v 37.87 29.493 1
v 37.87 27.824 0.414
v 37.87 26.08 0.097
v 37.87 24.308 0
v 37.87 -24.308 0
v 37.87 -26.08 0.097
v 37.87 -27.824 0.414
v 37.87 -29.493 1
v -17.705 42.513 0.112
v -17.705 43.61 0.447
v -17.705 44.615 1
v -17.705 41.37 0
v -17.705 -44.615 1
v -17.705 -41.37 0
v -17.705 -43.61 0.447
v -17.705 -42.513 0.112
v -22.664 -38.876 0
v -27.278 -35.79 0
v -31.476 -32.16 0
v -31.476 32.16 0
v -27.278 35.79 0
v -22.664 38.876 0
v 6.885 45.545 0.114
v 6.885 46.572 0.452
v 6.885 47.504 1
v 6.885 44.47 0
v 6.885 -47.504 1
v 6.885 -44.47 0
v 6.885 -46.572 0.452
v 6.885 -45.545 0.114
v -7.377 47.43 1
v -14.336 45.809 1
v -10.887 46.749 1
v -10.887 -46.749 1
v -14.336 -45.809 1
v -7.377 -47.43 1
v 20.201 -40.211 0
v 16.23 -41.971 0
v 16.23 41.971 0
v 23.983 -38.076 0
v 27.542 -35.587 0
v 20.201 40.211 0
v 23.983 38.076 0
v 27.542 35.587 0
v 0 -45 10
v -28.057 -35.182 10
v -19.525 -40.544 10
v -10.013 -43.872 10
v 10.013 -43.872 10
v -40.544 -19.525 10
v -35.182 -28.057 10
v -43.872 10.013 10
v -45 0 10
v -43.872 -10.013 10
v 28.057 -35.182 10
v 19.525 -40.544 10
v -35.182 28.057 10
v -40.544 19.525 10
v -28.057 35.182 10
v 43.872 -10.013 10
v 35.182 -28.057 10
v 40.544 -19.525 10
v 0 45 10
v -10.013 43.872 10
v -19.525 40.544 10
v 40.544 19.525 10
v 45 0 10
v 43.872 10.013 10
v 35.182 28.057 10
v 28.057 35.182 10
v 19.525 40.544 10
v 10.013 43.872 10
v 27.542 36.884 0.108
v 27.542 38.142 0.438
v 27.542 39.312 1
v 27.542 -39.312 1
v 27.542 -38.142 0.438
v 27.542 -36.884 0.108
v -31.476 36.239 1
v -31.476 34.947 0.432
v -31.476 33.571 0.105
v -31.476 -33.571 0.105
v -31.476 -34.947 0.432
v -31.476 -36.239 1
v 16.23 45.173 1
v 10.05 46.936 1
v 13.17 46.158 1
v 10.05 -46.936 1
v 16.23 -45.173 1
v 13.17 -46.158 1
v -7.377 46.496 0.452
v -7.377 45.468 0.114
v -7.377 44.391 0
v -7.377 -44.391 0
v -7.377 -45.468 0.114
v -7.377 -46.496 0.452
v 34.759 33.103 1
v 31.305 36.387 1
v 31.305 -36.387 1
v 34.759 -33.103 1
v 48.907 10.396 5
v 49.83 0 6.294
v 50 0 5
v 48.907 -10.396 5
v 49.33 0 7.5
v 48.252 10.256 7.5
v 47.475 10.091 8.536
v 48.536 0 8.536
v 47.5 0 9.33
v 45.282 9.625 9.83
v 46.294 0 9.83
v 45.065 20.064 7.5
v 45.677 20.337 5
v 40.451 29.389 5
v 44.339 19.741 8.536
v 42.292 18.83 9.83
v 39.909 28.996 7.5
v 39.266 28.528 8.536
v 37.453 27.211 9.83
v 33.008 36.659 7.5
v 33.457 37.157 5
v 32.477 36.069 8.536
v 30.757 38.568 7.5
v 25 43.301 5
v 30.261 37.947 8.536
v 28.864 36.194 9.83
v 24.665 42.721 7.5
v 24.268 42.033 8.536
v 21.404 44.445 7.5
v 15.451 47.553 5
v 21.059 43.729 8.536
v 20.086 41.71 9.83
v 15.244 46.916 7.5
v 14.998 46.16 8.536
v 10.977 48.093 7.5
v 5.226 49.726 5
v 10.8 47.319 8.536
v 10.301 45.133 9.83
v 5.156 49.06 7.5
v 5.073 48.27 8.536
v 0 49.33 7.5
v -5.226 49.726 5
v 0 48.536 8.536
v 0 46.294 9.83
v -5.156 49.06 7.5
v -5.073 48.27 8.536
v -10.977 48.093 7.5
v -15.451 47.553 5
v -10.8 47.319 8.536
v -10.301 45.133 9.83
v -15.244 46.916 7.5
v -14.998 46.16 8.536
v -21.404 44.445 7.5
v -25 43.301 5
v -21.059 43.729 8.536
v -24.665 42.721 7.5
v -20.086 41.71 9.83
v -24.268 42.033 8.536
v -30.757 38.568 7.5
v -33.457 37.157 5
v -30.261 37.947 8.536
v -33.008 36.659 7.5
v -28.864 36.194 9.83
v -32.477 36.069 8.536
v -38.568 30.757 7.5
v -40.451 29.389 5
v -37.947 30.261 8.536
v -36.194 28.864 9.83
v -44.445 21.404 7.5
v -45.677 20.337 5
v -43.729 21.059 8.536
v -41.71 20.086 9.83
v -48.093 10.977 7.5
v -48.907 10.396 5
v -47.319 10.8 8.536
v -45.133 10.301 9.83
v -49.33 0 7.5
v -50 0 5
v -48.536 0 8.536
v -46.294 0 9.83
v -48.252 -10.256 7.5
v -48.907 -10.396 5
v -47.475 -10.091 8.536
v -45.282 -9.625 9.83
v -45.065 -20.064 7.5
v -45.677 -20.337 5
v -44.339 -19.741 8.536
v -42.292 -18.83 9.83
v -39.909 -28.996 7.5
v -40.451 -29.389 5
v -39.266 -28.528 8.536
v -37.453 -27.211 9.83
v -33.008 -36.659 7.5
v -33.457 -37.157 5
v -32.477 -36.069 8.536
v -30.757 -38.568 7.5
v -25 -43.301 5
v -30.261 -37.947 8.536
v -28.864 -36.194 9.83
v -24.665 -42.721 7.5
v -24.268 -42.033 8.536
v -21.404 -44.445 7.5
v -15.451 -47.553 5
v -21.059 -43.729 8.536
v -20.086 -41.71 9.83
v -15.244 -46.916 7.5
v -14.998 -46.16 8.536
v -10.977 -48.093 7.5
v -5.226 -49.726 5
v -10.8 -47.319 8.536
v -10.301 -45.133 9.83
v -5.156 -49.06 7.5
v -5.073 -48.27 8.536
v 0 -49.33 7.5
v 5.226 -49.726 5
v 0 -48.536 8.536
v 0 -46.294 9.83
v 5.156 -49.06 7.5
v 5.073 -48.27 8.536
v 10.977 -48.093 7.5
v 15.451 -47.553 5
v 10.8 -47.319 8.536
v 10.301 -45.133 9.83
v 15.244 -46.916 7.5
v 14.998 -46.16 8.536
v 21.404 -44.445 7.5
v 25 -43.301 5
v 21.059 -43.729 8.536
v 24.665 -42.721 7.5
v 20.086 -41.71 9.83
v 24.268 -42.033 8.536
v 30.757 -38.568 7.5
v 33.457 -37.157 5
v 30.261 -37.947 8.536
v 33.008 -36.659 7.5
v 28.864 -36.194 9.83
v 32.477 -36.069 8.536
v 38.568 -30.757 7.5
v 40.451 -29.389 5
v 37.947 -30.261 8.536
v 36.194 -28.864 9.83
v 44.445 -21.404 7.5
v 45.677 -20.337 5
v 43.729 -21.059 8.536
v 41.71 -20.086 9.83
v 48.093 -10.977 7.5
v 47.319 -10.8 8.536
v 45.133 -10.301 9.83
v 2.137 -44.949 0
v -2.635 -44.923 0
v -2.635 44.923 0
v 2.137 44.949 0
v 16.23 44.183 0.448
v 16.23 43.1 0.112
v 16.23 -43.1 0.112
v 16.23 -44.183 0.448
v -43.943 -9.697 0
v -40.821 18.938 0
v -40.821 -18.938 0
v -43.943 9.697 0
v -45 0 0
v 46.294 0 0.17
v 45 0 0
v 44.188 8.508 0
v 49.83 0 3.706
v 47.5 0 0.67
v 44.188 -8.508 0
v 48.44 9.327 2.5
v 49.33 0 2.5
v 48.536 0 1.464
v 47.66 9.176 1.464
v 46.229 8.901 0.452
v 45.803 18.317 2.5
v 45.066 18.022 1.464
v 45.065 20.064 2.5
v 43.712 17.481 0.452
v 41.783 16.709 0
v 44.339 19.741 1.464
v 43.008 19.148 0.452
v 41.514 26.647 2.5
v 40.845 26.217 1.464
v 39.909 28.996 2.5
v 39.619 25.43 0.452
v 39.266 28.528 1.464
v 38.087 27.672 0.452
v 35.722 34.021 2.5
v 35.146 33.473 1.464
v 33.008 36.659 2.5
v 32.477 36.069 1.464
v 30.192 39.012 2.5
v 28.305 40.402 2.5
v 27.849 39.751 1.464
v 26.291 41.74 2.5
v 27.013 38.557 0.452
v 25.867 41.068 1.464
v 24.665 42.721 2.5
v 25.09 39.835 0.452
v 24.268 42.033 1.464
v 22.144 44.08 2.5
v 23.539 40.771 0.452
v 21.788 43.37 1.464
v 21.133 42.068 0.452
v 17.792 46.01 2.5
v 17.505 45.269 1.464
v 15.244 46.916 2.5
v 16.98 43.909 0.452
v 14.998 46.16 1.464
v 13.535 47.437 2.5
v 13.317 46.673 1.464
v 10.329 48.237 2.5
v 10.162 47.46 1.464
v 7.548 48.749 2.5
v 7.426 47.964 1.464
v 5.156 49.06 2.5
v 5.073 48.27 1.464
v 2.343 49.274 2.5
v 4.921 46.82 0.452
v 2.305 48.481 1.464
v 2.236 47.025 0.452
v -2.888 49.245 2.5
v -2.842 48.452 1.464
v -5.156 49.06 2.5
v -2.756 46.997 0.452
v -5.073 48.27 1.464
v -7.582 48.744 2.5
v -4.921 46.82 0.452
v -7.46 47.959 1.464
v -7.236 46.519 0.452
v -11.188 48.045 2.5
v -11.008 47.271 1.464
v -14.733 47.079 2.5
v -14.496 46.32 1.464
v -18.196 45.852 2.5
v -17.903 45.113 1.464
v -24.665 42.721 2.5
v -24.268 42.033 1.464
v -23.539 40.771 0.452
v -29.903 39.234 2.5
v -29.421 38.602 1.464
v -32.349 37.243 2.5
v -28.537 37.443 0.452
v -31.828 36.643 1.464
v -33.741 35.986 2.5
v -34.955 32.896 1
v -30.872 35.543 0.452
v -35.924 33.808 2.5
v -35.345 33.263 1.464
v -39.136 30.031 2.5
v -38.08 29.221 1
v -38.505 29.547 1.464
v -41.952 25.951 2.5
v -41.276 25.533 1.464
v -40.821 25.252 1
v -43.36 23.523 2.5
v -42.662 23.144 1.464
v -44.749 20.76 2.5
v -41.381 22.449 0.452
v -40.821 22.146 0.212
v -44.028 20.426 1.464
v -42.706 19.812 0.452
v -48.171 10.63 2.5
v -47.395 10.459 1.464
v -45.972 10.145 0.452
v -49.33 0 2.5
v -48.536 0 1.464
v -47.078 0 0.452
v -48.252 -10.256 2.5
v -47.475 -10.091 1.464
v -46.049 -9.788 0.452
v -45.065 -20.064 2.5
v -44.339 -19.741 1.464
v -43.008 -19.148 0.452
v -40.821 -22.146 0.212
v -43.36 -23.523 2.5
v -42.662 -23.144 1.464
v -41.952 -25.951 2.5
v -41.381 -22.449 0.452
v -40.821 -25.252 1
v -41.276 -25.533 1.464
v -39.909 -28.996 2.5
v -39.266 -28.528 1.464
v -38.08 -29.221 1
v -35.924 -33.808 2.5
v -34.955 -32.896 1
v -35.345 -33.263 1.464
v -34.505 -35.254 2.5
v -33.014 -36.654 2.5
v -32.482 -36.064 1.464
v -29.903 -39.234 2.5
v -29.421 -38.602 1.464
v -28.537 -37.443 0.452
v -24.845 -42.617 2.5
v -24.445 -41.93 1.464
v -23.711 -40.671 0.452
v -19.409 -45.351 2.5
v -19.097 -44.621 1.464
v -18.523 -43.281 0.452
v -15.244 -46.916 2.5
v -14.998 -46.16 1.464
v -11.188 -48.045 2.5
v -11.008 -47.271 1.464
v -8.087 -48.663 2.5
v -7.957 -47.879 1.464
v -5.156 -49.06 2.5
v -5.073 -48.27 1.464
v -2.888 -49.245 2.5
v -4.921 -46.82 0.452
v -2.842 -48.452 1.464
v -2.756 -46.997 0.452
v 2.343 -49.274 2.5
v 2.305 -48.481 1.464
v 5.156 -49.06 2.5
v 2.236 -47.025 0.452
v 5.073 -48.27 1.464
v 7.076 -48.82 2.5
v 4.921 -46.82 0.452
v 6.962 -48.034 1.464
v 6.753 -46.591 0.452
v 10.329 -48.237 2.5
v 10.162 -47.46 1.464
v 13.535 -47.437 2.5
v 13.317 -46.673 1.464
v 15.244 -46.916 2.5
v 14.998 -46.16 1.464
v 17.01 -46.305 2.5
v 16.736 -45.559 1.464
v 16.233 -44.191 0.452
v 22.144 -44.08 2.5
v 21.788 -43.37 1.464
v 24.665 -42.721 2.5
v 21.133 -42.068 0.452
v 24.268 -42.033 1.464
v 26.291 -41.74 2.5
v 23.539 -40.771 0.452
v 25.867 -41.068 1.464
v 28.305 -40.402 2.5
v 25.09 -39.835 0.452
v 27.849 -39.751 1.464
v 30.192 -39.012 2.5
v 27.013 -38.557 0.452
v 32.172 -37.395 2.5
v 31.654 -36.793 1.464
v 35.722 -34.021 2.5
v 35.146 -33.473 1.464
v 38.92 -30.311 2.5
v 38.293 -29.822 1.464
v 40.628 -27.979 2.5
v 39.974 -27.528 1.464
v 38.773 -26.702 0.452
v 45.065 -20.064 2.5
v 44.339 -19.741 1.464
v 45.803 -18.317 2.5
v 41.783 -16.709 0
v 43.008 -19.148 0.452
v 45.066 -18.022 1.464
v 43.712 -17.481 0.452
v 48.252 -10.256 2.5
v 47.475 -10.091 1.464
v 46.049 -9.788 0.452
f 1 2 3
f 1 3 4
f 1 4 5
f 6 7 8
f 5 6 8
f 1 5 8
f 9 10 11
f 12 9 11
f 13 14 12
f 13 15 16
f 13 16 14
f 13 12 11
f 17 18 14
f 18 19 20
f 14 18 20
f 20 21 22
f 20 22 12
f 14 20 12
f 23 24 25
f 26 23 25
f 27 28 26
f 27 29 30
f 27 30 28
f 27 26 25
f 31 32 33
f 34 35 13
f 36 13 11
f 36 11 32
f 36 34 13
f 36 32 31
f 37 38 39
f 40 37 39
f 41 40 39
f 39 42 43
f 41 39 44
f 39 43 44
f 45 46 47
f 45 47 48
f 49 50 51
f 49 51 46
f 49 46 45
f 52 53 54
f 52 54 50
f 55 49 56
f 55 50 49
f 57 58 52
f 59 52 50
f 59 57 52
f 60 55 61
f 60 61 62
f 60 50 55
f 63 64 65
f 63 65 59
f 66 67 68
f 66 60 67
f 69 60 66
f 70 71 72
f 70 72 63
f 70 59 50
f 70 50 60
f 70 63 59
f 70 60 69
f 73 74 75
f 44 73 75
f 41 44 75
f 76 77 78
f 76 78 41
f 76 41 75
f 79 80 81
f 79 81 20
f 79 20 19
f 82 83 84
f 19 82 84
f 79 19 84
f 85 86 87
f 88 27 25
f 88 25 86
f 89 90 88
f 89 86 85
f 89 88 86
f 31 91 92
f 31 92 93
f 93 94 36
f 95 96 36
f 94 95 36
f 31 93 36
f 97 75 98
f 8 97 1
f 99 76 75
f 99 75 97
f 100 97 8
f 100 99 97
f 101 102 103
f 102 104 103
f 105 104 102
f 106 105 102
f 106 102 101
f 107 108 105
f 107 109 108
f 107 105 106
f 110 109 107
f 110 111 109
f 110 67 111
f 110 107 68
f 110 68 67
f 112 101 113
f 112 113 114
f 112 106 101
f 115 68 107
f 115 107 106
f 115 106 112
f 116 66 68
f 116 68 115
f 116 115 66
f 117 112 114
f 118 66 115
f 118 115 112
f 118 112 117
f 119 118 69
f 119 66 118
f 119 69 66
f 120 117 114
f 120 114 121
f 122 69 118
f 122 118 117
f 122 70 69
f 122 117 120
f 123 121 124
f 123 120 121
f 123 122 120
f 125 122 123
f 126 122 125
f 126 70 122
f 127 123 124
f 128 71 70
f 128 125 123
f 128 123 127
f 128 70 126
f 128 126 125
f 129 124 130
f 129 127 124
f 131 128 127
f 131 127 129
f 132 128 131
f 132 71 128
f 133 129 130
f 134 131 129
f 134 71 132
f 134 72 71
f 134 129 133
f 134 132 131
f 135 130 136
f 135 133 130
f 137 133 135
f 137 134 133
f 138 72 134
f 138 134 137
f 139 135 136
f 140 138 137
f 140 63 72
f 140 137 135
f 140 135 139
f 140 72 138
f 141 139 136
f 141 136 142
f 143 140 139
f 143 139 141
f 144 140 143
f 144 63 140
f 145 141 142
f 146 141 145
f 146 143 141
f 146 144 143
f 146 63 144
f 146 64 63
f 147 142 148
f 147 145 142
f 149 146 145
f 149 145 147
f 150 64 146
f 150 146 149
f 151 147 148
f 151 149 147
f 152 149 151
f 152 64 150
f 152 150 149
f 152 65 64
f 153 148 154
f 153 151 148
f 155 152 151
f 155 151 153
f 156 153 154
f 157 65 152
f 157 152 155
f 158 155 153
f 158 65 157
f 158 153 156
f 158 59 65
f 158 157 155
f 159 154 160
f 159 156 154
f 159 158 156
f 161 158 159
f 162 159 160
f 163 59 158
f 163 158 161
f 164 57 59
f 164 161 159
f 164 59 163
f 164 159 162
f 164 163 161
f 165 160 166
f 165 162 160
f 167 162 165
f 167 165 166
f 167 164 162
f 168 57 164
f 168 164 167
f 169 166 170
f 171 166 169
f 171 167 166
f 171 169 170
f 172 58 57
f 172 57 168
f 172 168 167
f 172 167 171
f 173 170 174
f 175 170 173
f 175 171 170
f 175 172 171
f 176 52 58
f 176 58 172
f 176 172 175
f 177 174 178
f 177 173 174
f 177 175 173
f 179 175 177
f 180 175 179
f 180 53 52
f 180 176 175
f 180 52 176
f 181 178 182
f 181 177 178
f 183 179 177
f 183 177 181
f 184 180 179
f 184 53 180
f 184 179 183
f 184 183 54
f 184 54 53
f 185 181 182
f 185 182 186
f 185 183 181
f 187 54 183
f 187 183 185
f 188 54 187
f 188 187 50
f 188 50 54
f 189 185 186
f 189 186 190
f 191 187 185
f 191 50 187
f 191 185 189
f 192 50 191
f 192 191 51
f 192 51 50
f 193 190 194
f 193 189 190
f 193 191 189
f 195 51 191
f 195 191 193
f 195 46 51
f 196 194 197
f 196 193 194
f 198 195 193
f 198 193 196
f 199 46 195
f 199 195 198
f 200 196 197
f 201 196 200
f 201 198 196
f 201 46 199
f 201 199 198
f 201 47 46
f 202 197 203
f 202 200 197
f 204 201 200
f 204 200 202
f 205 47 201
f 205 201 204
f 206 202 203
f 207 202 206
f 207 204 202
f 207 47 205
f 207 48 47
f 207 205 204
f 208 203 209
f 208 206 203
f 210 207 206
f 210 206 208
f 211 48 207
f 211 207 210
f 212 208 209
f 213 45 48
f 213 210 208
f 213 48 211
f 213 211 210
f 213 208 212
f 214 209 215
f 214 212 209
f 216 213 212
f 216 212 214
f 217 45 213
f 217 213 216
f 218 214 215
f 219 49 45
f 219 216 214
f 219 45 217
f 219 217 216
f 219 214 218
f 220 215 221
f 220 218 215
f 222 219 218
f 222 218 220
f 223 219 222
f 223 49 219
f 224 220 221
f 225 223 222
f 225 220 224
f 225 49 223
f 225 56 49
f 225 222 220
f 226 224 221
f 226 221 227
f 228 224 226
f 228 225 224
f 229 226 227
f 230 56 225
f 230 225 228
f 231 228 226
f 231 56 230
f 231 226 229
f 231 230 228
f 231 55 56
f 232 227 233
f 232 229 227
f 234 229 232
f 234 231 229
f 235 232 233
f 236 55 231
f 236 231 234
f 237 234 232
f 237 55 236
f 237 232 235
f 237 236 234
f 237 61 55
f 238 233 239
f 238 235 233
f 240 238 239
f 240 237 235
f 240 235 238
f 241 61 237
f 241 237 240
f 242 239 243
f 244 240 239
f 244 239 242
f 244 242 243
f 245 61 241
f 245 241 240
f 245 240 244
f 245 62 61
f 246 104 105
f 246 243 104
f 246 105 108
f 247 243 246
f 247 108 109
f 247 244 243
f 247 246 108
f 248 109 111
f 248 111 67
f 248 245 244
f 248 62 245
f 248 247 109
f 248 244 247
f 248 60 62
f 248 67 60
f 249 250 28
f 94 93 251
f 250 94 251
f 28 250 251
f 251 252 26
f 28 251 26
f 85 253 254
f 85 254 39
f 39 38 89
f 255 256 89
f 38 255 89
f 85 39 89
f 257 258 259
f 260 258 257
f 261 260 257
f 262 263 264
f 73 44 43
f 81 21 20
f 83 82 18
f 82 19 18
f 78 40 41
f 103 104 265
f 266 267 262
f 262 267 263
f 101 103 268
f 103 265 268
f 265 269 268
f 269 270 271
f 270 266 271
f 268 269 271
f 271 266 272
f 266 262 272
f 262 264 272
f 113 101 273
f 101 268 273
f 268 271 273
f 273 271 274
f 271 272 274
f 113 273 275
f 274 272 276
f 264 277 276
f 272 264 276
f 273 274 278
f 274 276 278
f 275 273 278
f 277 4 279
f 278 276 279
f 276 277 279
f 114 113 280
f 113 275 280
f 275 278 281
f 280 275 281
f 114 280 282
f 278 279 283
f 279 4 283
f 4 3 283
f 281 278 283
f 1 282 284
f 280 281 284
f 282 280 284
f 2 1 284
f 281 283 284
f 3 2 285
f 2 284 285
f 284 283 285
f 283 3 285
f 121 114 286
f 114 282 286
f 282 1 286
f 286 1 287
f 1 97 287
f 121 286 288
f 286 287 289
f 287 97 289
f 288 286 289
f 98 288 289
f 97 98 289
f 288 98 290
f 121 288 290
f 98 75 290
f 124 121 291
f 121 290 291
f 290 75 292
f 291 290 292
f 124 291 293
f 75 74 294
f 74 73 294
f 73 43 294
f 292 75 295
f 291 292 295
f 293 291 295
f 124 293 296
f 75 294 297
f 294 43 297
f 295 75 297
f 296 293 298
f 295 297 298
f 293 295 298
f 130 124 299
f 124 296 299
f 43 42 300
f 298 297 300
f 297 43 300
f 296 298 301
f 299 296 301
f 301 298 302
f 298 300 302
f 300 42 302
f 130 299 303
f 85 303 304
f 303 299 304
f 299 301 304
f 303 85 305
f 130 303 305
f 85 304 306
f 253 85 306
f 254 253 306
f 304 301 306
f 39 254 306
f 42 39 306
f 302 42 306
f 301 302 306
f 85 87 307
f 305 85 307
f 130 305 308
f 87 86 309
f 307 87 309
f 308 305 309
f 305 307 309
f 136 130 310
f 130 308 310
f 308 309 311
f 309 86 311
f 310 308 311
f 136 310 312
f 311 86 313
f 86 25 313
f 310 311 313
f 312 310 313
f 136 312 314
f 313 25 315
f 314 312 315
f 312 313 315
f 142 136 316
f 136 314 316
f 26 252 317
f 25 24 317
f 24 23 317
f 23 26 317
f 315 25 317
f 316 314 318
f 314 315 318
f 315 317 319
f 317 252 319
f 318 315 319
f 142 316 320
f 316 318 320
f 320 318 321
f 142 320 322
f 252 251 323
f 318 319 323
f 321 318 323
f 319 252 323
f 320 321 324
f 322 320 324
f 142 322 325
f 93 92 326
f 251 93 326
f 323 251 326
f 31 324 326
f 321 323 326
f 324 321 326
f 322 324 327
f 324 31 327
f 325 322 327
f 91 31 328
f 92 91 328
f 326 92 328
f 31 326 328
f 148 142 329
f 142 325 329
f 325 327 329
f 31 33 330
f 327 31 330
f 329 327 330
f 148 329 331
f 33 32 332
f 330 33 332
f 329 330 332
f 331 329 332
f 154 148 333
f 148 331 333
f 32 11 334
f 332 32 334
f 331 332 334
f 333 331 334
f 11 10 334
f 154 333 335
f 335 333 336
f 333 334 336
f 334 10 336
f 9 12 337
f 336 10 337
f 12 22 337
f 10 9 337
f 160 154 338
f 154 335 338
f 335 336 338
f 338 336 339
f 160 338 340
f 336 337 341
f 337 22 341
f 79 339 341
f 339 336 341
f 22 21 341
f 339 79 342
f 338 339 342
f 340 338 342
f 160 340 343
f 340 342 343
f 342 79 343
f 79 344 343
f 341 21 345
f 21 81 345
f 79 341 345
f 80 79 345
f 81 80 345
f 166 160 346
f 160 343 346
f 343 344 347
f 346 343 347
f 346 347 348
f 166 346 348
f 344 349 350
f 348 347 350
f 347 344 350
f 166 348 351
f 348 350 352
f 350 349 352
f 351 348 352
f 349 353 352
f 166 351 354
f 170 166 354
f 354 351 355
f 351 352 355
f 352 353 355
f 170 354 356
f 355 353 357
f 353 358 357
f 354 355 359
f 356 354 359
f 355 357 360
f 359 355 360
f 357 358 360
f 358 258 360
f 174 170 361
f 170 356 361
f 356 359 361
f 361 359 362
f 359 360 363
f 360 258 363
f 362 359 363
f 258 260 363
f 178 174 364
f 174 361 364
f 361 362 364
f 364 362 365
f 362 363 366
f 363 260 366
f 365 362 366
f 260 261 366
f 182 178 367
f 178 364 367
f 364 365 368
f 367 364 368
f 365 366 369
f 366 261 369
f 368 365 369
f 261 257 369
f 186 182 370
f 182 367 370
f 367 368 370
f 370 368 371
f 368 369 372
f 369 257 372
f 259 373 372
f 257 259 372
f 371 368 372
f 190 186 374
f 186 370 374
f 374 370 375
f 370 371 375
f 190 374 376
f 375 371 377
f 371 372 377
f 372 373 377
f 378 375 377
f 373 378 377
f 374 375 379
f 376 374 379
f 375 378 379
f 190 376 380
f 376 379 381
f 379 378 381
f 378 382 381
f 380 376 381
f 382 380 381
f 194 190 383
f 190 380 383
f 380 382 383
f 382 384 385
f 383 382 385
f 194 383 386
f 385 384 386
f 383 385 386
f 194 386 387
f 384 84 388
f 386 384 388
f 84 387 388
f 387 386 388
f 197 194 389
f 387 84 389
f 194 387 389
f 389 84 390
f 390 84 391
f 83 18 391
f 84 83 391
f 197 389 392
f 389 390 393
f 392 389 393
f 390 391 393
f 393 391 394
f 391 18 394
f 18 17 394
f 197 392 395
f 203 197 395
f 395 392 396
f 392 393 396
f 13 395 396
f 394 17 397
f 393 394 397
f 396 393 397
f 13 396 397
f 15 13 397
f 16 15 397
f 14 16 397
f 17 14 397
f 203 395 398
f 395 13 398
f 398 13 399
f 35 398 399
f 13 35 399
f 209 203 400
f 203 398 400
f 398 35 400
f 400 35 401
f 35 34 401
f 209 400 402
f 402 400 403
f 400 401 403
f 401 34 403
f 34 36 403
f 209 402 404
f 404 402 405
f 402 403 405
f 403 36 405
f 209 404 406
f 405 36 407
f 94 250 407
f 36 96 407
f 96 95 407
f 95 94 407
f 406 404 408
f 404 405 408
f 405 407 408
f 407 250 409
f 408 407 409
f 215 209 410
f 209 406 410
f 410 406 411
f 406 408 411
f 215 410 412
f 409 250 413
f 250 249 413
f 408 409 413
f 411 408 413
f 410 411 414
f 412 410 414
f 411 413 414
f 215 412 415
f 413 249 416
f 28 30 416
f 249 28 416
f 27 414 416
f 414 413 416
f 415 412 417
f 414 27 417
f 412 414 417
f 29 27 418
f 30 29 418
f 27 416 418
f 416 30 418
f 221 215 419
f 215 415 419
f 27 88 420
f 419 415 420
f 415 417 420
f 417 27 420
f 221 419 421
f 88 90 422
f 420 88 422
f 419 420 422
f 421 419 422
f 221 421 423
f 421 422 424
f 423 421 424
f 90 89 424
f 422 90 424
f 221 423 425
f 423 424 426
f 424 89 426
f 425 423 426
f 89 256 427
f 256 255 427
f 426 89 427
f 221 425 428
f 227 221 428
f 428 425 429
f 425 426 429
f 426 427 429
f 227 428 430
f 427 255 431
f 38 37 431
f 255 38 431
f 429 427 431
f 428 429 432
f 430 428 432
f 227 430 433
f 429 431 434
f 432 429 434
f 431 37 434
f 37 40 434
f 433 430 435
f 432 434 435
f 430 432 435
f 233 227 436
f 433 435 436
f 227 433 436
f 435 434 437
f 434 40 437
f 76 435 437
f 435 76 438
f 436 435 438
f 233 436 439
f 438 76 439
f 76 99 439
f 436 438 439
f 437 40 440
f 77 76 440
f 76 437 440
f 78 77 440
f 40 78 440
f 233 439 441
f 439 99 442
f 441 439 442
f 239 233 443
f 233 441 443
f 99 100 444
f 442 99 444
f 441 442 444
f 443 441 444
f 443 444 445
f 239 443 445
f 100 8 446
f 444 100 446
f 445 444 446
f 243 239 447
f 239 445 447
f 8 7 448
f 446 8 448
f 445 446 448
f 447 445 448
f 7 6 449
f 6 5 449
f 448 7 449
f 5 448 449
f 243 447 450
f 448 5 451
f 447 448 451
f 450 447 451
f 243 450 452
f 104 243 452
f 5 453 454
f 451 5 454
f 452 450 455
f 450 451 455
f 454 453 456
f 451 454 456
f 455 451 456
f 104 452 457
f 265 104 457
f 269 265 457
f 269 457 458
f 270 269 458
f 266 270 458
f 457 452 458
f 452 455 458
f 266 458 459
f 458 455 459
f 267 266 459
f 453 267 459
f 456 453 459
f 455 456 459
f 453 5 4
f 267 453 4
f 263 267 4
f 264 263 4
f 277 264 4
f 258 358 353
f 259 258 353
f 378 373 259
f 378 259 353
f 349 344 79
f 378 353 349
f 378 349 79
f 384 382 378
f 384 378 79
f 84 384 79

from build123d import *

# Parameters (mm, degrees)
F0_R     = 50
F1_DEPTH = 10
F2_R     = 4.99999
F3_W     = 9.3445703387
F3_H     = 114.5939677954
F3_W_2   = 10.3282090276
F3_H_2   = 115.5776083469
F3_W_3   = 9.3445708044
F3_H_3   = 117.5448857248
F3_H_4   = 117.0530617237
F4_DEPTH = 1


# Not quite as in the source:
# - a fillet or chamfer is up to 0.001 mm smaller than in the source, because OpenCascade refuses the exact size


with BuildPart() as f1:
    # F0 (on Top) → F1 (new body)
    with BuildSketch(Plane.XY):
        Circle(F0_R)
    extrude(amount=F1_DEPTH)

    # F2 (radius 5 in the source; OpenCascade refuses exactly that, so slightly less here)
    f2_edges = [f1.edges().sort_by_distance(p)[0] for p in [
        (-50, 0, 0),
        (-50, 0, 10),
    ]]
    fillet(f2_edges, radius=F2_R)

    # F3 (on face) → F4 (cut)
    with BuildSketch(Plane(origin=(0, 0, 0), x_dir=(1, 0, 0), z_dir=(0, 0, -1))):
        with Locations((-36.148738116, -1.2295395136)):
            Rectangle(F3_W, F3_H)
        with Locations((-12.5413937494, -1.7213597894)):
            Rectangle(F3_W_2, F3_H_2)
        with Locations((11.5577613469, -2.2131819278)):
            Rectangle(F3_W_3, F3_H_3)
        with Locations((32.7060082927, -2.9509104788)):
            Rectangle(F3_W_2, F3_H_4)
    extrude(amount=-F4_DEPTH, mode=Mode.SUBTRACT)


solid = f1.part
